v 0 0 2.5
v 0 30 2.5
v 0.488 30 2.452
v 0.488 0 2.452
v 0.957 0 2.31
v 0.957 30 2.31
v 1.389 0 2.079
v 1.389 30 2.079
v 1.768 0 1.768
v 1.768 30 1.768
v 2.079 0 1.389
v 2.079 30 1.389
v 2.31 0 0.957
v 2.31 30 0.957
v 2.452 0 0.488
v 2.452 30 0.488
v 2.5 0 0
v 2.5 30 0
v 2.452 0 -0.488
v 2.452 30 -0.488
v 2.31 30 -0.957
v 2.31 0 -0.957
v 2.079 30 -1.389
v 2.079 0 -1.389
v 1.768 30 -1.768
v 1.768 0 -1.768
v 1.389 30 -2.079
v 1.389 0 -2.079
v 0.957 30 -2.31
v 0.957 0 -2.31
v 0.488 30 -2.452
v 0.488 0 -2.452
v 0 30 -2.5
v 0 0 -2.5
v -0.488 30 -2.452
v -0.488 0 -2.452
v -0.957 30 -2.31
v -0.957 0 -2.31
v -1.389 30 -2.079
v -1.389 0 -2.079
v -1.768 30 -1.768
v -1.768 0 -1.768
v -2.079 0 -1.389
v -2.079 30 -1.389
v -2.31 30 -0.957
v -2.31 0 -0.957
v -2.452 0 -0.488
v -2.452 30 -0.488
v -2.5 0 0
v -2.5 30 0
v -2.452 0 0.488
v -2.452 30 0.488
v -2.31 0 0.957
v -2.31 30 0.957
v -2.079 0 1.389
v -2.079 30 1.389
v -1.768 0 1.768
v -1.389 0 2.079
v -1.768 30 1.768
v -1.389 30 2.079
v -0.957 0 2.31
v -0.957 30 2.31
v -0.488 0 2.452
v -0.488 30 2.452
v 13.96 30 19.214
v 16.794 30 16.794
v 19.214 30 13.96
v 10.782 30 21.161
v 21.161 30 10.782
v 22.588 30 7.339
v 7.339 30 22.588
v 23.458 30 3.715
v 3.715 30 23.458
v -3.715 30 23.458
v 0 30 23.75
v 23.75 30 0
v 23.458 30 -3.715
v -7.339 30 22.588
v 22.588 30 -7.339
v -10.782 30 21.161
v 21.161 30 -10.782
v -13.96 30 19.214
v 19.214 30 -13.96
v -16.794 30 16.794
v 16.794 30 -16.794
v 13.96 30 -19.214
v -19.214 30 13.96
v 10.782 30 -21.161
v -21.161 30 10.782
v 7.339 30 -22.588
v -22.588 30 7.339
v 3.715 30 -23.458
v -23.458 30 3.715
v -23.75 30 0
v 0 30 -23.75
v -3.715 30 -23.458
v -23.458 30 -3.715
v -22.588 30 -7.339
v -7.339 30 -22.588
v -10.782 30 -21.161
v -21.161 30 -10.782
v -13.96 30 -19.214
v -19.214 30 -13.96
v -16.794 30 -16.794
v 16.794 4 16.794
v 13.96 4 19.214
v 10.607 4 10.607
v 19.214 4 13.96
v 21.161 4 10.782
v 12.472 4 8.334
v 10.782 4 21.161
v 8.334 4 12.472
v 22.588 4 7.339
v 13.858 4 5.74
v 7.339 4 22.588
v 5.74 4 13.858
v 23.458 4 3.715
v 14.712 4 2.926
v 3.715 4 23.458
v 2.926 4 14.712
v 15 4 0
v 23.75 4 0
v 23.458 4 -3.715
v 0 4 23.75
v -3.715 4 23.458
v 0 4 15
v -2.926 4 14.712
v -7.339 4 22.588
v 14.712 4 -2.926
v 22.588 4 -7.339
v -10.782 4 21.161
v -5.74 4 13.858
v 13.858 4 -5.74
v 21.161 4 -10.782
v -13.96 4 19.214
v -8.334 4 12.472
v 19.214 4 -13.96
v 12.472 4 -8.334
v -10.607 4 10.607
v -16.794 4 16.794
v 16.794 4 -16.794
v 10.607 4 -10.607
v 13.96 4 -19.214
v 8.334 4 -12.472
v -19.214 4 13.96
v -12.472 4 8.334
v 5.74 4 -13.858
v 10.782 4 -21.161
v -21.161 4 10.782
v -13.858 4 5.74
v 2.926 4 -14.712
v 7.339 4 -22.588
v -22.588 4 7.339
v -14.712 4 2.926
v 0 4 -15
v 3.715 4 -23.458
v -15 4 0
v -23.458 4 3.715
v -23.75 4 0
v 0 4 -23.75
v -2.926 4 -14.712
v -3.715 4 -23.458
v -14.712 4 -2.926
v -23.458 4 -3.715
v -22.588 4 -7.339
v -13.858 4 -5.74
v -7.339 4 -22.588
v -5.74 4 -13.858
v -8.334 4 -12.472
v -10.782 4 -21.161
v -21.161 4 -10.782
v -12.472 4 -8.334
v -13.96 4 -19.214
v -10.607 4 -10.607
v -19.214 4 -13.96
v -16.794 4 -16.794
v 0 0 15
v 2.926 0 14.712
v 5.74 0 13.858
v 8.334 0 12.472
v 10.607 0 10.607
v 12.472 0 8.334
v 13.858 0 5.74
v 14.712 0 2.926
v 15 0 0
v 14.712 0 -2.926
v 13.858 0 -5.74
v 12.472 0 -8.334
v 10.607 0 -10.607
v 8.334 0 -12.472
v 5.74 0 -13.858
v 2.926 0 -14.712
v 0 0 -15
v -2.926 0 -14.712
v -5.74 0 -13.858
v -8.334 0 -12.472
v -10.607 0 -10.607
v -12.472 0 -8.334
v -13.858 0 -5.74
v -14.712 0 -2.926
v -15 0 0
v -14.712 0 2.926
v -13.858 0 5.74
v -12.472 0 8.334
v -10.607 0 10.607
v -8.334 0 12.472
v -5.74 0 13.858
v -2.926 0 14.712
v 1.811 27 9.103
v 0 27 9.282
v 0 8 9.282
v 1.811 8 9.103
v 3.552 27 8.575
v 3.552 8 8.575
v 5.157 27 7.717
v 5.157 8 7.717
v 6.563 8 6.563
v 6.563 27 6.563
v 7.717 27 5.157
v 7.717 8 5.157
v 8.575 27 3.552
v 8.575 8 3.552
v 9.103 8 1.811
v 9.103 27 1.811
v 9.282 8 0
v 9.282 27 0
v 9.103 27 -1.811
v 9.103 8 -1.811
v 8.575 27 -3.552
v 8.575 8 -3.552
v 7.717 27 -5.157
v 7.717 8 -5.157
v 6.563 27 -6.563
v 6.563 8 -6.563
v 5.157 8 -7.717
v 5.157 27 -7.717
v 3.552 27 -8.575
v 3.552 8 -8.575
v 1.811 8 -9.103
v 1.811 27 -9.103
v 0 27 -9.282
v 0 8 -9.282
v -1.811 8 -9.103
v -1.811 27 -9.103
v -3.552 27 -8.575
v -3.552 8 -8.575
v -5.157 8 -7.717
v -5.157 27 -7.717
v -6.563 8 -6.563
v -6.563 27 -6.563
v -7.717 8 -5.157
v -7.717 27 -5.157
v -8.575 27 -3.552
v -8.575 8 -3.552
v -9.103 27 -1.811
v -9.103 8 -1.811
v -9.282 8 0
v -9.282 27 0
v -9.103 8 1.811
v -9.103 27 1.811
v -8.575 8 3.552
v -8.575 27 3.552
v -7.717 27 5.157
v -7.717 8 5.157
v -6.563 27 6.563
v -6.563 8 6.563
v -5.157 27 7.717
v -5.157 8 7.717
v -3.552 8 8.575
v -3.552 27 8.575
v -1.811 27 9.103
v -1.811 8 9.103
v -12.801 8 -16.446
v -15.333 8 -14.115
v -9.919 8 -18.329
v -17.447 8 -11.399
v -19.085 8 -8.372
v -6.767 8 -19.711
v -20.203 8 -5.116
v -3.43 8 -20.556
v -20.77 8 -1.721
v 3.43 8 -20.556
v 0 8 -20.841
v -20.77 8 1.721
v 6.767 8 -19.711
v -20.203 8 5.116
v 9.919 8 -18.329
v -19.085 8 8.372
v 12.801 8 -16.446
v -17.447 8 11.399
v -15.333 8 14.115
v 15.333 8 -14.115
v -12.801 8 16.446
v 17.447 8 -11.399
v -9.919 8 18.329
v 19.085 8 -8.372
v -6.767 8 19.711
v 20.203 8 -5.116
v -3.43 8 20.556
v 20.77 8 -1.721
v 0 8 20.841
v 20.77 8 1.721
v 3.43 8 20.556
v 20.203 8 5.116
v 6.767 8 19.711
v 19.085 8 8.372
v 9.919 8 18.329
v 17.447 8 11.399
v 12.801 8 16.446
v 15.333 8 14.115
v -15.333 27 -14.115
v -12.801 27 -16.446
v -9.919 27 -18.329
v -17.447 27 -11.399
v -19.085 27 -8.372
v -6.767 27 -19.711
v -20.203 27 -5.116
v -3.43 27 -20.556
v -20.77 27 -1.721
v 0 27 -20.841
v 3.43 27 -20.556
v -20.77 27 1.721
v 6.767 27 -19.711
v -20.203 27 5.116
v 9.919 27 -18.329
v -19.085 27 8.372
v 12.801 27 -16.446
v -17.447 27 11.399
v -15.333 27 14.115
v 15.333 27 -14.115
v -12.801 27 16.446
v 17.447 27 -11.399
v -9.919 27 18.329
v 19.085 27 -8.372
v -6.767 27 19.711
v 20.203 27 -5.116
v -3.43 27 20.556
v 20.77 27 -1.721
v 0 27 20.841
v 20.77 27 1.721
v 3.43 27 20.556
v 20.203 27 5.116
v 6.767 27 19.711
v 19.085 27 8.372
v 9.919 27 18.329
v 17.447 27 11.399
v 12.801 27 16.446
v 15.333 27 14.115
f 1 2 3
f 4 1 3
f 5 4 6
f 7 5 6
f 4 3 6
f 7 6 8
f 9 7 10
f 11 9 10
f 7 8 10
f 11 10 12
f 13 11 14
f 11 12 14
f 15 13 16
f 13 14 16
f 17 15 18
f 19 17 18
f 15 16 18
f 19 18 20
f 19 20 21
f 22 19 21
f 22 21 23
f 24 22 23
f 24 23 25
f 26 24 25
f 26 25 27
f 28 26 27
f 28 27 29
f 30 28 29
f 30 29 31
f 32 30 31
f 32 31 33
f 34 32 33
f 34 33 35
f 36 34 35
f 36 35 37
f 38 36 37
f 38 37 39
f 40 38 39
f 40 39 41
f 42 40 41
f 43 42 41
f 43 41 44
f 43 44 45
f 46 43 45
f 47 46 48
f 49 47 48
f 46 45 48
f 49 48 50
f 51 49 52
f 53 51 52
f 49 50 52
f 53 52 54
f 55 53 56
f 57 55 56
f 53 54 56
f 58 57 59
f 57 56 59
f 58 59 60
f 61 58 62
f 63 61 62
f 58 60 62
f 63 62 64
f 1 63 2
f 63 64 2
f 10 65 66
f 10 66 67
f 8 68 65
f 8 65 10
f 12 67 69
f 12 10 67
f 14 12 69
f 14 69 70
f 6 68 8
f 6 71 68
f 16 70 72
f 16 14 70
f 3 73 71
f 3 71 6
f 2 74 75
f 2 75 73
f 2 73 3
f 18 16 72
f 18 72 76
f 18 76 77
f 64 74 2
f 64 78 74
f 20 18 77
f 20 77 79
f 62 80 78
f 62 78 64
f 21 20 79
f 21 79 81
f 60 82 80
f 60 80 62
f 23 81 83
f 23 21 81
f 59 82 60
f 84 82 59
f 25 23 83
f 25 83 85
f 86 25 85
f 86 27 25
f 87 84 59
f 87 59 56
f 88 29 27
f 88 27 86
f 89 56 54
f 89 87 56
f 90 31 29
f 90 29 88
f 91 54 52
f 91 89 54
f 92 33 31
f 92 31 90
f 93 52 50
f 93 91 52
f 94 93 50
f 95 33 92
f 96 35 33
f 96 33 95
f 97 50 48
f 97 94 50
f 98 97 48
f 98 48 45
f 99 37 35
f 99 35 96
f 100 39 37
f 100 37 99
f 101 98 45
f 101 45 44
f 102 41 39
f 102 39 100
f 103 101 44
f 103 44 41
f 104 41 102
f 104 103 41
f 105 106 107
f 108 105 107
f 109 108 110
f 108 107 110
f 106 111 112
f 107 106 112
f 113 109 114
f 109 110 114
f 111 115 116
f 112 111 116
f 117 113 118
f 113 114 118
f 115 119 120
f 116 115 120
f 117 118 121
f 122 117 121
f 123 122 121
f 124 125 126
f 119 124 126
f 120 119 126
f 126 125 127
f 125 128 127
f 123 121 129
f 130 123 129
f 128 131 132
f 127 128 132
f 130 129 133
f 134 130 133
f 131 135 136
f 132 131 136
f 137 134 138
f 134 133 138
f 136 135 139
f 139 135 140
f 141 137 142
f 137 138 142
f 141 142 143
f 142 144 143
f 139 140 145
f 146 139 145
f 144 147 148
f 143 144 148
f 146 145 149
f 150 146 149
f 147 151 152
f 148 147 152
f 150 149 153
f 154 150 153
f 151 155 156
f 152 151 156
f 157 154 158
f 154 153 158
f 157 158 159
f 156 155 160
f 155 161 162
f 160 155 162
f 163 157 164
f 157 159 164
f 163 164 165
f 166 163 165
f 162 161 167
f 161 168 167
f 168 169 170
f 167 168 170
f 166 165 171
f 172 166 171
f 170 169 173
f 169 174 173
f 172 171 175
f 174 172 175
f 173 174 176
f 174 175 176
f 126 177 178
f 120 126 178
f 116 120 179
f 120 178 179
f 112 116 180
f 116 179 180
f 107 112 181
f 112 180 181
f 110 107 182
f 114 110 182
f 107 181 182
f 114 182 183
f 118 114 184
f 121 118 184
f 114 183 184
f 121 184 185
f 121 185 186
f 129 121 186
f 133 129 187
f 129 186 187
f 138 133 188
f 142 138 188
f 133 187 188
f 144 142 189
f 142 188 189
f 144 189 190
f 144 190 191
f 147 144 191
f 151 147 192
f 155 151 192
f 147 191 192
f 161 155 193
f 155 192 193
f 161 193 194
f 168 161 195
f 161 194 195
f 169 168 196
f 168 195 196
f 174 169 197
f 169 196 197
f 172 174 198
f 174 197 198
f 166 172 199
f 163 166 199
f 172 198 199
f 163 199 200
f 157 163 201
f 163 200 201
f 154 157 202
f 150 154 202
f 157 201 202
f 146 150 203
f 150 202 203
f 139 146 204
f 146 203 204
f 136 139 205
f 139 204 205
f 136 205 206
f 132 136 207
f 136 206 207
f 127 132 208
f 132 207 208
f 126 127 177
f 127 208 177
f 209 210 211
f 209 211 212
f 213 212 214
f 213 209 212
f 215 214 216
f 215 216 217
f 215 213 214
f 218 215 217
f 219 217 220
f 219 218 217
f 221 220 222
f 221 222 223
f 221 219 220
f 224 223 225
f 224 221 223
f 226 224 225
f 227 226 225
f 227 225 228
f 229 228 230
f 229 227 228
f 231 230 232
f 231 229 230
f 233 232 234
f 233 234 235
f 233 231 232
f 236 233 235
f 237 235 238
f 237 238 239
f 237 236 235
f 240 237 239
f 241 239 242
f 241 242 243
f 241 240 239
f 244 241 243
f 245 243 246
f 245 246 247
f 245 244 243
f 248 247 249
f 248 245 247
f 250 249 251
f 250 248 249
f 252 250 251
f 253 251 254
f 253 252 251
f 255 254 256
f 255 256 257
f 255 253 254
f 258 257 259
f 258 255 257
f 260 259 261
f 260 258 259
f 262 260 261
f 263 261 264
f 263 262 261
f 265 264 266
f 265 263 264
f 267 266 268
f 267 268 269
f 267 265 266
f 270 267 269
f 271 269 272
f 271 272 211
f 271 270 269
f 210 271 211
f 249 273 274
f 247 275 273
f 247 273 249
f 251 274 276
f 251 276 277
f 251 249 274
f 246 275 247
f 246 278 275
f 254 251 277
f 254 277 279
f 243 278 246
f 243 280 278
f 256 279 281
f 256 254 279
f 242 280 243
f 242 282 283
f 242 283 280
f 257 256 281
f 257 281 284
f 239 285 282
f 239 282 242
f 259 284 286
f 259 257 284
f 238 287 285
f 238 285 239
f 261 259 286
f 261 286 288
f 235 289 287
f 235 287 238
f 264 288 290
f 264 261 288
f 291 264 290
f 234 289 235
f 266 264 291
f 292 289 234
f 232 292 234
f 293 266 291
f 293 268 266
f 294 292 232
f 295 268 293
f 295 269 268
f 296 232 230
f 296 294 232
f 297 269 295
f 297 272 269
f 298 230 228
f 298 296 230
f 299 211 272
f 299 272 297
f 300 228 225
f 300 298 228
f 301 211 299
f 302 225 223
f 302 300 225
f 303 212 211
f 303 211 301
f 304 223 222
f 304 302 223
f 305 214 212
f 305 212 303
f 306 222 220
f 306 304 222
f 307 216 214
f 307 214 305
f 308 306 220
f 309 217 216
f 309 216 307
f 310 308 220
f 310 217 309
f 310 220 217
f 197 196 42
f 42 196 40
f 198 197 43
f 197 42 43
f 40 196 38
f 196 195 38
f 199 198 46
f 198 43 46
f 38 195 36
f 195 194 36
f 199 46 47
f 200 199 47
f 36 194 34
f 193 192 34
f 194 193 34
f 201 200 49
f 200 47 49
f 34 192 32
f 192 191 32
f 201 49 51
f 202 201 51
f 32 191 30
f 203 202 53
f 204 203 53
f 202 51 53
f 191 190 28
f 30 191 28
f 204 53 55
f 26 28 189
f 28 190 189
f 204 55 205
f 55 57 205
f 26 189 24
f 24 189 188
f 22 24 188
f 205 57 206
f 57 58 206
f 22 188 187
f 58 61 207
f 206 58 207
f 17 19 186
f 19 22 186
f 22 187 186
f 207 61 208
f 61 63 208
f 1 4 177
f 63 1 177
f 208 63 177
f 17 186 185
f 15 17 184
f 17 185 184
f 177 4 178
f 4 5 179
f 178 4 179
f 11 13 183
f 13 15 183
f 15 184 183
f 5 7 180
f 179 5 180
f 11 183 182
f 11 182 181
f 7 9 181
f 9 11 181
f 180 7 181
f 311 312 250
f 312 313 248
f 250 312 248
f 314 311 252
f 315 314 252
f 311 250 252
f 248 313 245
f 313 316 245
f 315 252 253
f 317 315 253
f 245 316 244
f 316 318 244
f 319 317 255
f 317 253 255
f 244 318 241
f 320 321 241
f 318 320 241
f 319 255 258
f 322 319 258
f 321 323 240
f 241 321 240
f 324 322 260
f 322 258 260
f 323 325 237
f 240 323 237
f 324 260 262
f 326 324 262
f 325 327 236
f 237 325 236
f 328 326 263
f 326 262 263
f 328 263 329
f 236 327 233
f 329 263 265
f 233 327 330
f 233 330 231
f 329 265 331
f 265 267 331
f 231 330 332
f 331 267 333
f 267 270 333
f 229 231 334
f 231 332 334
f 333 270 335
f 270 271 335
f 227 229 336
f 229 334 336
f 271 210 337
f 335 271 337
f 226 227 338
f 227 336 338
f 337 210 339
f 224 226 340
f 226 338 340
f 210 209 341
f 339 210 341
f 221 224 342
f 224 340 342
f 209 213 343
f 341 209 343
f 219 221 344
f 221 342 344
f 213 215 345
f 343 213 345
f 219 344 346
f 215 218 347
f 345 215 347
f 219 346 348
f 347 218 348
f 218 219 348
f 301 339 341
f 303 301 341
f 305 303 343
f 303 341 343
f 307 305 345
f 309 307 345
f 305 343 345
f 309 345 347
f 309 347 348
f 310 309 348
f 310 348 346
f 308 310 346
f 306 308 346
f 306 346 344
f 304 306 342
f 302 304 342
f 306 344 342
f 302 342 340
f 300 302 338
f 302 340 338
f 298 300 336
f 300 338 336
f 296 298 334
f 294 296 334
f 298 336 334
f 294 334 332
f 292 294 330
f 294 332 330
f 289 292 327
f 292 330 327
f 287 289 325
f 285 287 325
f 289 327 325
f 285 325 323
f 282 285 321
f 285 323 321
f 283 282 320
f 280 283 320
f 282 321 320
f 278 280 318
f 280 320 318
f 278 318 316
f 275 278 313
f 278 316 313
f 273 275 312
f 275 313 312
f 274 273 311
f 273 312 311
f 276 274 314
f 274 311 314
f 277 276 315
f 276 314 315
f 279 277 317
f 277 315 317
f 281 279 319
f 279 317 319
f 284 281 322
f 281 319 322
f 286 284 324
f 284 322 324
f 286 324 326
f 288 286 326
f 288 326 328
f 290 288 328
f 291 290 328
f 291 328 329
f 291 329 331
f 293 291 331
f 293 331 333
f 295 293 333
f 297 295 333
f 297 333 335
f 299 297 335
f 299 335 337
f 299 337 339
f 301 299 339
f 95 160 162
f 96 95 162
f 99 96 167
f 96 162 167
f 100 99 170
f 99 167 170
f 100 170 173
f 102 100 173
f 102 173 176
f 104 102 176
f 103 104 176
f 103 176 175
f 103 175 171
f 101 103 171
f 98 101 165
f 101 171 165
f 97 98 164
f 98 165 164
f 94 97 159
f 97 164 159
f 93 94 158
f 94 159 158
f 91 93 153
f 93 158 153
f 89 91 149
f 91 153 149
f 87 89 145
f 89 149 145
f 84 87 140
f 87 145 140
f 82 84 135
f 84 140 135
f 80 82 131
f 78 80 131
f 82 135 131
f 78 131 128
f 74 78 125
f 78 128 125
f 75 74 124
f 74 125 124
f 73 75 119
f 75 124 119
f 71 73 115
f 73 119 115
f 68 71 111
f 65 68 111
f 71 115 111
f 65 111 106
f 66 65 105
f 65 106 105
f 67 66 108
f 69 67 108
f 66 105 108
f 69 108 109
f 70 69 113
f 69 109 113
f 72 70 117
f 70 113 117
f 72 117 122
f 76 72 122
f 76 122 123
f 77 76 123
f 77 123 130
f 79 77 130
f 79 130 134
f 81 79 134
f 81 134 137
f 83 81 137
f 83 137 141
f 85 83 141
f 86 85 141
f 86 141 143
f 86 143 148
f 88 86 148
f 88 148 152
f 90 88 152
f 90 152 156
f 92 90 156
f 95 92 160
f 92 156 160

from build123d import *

# Parameters (mm, degrees)
CROQUIS1_R              = 15
SALIENTE_EXTRUIR1_DEPTH = 4
CROQUIS2_R              = 23.75
SALIENTE_EXTRUIR2_DEPTH = 26
CROQUIS3_R              = 2.5
CORTAR_EXTRUIR1_DEPTH   = 40
CORTAR_EXTRUIR3_START   = -3
CROQUIS4_R              = 20.840702769
CROQUIS4_R_2            = 9.281745818
CORTAR_EXTRUIR3_DEPTH   = 19


with BuildPart() as part:
    # Croquis1 → Saliente-Extruir1 (new body)
    with BuildSketch(Plane(origin=(0, 0, 0), x_dir=(1, 0, 0), z_dir=(0, 1, 0))):
        with Locations(Location((0, 0, 0), (0, 0, 270))):
            Circle(CROQUIS1_R)
    extrude(amount=SALIENTE_EXTRUIR1_DEPTH)

    # Croquis2 → Saliente-Extruir2 (add)
    with BuildSketch(Plane(origin=(0, 4, 0), x_dir=(1, 0, 0), z_dir=(0, 1, 0))):
        with Locations(Location((0, 0, 0), (0, 0, 90))):
            Circle(CROQUIS2_R)
    extrude(amount=SALIENTE_EXTRUIR2_DEPTH)

    # Croquis3 → Cortar-Extruir1 (cut)
    with BuildSketch(Plane(origin=(0, 30, 0), x_dir=(1, 0, 0), z_dir=(0, 1, 0))):
        with Locations(Location((0, 0, 0), (0, 0, 270))):
            Circle(CROQUIS3_R)
    extrude(amount=-CORTAR_EXTRUIR1_DEPTH, mode=Mode.SUBTRACT)

    # Croquis4 → Cortar-Extruir3 (cut)
    with BuildSketch(Plane(origin=(0, 30, 0), x_dir=(1, 0, 0), z_dir=(0, 1, 0)).offset(CORTAR_EXTRUIR3_START)):
        with Locations(Location((0, 0, 0), (0, 0, 270))):
            Circle(CROQUIS4_R)
        with Locations(Location((0, 0, 0), (0, 0, 270))):
            Circle(CROQUIS4_R_2, mode=Mode.SUBTRACT)
    extrude(amount=-CORTAR_EXTRUIR3_DEPTH, mode=Mode.SUBTRACT)


solid = part.part
